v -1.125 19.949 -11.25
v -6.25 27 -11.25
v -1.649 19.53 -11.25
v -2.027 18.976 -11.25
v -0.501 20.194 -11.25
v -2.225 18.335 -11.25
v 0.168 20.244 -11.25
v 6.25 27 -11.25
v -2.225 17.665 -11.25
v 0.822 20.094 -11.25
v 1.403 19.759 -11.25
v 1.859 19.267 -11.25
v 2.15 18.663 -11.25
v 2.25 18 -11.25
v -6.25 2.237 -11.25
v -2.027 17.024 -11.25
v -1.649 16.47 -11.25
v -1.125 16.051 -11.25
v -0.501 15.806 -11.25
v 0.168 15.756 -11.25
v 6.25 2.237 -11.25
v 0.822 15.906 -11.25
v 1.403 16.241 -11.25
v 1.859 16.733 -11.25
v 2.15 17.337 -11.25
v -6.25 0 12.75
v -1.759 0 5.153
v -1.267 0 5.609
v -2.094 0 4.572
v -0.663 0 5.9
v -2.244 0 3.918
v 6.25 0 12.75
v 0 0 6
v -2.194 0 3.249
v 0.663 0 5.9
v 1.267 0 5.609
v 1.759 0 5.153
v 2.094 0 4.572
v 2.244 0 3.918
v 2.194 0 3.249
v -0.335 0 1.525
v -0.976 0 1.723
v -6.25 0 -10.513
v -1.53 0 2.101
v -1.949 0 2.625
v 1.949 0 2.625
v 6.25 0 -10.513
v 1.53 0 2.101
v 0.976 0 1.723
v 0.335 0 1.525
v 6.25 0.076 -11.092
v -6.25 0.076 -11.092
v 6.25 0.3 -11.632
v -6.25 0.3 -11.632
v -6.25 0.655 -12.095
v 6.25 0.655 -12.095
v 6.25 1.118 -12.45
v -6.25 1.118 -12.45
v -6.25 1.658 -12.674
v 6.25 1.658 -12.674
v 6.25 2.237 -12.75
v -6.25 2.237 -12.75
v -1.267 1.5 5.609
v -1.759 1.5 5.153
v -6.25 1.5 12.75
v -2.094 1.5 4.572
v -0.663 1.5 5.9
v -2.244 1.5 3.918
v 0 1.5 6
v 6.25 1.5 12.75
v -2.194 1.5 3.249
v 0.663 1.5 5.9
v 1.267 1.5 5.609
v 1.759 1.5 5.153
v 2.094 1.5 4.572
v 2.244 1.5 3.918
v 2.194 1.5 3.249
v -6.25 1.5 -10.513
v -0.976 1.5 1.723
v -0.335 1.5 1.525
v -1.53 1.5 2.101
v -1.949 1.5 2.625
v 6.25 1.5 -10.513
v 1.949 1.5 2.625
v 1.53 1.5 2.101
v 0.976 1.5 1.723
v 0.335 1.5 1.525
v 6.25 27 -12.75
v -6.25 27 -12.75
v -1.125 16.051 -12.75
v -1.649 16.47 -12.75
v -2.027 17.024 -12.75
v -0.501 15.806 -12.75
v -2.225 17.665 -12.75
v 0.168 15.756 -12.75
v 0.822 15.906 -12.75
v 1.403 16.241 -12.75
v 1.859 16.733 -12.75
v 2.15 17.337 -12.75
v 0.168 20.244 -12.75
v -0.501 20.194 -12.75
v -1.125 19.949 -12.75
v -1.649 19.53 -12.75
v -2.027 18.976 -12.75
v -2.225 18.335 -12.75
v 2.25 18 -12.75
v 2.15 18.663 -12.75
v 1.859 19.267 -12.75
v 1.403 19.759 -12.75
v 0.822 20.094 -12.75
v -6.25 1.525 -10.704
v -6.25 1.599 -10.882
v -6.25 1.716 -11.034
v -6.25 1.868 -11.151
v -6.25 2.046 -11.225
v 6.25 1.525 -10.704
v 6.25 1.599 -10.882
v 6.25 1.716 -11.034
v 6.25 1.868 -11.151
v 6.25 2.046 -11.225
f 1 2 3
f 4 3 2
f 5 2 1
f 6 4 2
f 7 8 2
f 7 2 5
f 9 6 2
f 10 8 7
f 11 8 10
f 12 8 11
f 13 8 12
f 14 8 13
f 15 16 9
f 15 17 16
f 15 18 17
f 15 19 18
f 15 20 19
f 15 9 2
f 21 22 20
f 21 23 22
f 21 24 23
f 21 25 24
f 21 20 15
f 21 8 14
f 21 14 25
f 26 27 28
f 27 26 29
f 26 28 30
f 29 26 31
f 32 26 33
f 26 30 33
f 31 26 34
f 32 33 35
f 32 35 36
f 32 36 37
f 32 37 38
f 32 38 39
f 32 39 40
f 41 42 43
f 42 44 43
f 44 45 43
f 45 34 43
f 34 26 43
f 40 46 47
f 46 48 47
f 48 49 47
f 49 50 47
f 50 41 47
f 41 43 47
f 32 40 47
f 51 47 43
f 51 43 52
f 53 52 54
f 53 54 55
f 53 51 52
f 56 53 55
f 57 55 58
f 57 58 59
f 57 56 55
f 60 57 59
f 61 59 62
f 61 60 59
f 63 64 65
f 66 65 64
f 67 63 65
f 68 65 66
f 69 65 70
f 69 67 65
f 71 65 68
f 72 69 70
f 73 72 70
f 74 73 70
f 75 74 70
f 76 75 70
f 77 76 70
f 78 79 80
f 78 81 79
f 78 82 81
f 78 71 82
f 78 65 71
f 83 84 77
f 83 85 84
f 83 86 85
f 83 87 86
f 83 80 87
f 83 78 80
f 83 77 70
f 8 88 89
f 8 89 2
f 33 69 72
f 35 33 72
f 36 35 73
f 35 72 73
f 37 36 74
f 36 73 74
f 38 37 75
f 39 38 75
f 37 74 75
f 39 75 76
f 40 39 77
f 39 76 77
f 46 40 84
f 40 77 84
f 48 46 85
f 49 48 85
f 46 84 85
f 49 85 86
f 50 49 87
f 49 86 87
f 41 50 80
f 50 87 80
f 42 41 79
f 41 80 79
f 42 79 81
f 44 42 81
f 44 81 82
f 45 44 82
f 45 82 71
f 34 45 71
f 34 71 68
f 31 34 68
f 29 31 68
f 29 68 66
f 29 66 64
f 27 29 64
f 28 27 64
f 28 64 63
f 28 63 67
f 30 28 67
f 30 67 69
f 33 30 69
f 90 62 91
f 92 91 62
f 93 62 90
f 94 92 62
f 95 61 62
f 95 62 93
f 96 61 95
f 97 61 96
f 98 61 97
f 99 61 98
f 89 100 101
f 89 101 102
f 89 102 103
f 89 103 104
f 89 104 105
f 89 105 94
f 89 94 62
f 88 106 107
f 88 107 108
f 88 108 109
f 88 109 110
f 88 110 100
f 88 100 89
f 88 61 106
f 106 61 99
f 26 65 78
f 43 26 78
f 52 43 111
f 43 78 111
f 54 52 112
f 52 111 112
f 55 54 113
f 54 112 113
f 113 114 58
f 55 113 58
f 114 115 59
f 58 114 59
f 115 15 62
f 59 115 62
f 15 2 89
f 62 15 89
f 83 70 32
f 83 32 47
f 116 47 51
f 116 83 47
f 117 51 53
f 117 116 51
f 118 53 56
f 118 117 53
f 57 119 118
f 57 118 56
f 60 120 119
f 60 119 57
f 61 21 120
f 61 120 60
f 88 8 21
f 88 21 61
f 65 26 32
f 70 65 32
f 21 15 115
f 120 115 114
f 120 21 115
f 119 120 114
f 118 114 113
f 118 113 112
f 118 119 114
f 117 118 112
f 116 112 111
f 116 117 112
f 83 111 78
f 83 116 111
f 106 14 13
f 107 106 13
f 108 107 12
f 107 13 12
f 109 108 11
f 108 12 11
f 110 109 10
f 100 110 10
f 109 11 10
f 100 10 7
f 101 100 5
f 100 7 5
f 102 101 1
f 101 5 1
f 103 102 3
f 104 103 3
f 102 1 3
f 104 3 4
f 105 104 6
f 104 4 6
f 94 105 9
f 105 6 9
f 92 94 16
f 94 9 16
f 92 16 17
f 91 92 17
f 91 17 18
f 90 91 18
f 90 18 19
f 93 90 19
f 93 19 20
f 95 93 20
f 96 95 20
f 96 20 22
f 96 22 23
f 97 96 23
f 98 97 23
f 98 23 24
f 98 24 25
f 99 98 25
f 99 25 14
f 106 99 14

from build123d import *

# Parameters (mm, degrees)
SKETCH_1_W                       = 12.5
SKETCH_1_H                       = 25.5
SM_BASE_FLANGE_1_DEPTH           = 1.5
SM_EDGE_FLANGE_1_STRIP_W         = 7.4732
SM_EDGE_FLANGE_1_STRIP_H         = 1.5
SM_EDGE_FLANGE_1_STRIP_CUT_DEPTH = 12.5
SM_EDGE_FLANGE_1_DEPTH           = 12.5
SKETCH_6_R                       = 2.25
CUT_EXTRUDE_1_DEPTH              = 10
SKETCH_7_R                       = 2.25
CUT_EXTRUDE_2_DEPTH              = 10


# Sheet-metal steps are written as plain solids
with BuildPart() as part:
    # Sketch 1 → 基材-凸緣1 (new body)
    with BuildSketch(Plane(origin=(0, 0, 0), x_dir=(1, 0, 0), z_dir=(0, 1, 0))):
        Rectangle(SKETCH_1_W, SKETCH_1_H)
    extrude(amount=SM_BASE_FLANGE_1_DEPTH)

    # 邊線-凸緣1 strip (across the edge) → 邊線-凸緣1 strip cut (cut)
    with BuildSketch(Plane(origin=(6.25, 1.5, -12.75), x_dir=(0, 0, 1), z_dir=(-1, 0, 0))):
        with Locations((-1.5, -0.75)):
            Rectangle(SM_EDGE_FLANGE_1_STRIP_W, SM_EDGE_FLANGE_1_STRIP_H)
    extrude(amount=SM_EDGE_FLANGE_1_STRIP_CUT_DEPTH, mode=Mode.SUBTRACT)

    # 邊線-凸緣1 section (across the edge) → 邊線-凸緣1 (add)
    with BuildSketch(Plane(origin=(6.25, 1.5, -12.75), x_dir=(0, 0, 1), z_dir=(-1, 0, 0))):
        with BuildLine():
            Line((0, 0.7366), (0, 25.5))
            Line((0, 25.5), (1.5, 25.5))
            Line((1.5, 25.5), (1.5, 0.7366))
            ThreePointArc((1.5, 0.7366), (1.715745145, 0.215745145), (2.2366, 0))
            Line((2.2366, 0), (2.2366, -1.5))
            ThreePointArc((2.2366, -1.5), (0.655084973, -0.844915027), (0, 0.7366))
        make_face()
    extrude(amount=SM_EDGE_FLANGE_1_DEPTH)

    # 草圖6 → 伸長1 (cut)
    with BuildSketch(Plane(origin=(0, 1.5, 0), x_dir=(1, 0, 0), z_dir=(0, 1, 0))):
        with Locations(Location((0, -3.75, 0), (0, 0, 270))):
            Circle(SKETCH_6_R)
    extrude(amount=-CUT_EXTRUDE_1_DEPTH, mode=Mode.SUBTRACT)

    # 草圖7 → 伸長2 (cut)
    with BuildSketch(Plane.XY.offset(-11.25)):
        with Locations((0, 18)):
            Circle(SKETCH_7_R)
    extrude(amount=-CUT_EXTRUDE_2_DEPTH, mode=Mode.SUBTRACT)


solid = part.part
